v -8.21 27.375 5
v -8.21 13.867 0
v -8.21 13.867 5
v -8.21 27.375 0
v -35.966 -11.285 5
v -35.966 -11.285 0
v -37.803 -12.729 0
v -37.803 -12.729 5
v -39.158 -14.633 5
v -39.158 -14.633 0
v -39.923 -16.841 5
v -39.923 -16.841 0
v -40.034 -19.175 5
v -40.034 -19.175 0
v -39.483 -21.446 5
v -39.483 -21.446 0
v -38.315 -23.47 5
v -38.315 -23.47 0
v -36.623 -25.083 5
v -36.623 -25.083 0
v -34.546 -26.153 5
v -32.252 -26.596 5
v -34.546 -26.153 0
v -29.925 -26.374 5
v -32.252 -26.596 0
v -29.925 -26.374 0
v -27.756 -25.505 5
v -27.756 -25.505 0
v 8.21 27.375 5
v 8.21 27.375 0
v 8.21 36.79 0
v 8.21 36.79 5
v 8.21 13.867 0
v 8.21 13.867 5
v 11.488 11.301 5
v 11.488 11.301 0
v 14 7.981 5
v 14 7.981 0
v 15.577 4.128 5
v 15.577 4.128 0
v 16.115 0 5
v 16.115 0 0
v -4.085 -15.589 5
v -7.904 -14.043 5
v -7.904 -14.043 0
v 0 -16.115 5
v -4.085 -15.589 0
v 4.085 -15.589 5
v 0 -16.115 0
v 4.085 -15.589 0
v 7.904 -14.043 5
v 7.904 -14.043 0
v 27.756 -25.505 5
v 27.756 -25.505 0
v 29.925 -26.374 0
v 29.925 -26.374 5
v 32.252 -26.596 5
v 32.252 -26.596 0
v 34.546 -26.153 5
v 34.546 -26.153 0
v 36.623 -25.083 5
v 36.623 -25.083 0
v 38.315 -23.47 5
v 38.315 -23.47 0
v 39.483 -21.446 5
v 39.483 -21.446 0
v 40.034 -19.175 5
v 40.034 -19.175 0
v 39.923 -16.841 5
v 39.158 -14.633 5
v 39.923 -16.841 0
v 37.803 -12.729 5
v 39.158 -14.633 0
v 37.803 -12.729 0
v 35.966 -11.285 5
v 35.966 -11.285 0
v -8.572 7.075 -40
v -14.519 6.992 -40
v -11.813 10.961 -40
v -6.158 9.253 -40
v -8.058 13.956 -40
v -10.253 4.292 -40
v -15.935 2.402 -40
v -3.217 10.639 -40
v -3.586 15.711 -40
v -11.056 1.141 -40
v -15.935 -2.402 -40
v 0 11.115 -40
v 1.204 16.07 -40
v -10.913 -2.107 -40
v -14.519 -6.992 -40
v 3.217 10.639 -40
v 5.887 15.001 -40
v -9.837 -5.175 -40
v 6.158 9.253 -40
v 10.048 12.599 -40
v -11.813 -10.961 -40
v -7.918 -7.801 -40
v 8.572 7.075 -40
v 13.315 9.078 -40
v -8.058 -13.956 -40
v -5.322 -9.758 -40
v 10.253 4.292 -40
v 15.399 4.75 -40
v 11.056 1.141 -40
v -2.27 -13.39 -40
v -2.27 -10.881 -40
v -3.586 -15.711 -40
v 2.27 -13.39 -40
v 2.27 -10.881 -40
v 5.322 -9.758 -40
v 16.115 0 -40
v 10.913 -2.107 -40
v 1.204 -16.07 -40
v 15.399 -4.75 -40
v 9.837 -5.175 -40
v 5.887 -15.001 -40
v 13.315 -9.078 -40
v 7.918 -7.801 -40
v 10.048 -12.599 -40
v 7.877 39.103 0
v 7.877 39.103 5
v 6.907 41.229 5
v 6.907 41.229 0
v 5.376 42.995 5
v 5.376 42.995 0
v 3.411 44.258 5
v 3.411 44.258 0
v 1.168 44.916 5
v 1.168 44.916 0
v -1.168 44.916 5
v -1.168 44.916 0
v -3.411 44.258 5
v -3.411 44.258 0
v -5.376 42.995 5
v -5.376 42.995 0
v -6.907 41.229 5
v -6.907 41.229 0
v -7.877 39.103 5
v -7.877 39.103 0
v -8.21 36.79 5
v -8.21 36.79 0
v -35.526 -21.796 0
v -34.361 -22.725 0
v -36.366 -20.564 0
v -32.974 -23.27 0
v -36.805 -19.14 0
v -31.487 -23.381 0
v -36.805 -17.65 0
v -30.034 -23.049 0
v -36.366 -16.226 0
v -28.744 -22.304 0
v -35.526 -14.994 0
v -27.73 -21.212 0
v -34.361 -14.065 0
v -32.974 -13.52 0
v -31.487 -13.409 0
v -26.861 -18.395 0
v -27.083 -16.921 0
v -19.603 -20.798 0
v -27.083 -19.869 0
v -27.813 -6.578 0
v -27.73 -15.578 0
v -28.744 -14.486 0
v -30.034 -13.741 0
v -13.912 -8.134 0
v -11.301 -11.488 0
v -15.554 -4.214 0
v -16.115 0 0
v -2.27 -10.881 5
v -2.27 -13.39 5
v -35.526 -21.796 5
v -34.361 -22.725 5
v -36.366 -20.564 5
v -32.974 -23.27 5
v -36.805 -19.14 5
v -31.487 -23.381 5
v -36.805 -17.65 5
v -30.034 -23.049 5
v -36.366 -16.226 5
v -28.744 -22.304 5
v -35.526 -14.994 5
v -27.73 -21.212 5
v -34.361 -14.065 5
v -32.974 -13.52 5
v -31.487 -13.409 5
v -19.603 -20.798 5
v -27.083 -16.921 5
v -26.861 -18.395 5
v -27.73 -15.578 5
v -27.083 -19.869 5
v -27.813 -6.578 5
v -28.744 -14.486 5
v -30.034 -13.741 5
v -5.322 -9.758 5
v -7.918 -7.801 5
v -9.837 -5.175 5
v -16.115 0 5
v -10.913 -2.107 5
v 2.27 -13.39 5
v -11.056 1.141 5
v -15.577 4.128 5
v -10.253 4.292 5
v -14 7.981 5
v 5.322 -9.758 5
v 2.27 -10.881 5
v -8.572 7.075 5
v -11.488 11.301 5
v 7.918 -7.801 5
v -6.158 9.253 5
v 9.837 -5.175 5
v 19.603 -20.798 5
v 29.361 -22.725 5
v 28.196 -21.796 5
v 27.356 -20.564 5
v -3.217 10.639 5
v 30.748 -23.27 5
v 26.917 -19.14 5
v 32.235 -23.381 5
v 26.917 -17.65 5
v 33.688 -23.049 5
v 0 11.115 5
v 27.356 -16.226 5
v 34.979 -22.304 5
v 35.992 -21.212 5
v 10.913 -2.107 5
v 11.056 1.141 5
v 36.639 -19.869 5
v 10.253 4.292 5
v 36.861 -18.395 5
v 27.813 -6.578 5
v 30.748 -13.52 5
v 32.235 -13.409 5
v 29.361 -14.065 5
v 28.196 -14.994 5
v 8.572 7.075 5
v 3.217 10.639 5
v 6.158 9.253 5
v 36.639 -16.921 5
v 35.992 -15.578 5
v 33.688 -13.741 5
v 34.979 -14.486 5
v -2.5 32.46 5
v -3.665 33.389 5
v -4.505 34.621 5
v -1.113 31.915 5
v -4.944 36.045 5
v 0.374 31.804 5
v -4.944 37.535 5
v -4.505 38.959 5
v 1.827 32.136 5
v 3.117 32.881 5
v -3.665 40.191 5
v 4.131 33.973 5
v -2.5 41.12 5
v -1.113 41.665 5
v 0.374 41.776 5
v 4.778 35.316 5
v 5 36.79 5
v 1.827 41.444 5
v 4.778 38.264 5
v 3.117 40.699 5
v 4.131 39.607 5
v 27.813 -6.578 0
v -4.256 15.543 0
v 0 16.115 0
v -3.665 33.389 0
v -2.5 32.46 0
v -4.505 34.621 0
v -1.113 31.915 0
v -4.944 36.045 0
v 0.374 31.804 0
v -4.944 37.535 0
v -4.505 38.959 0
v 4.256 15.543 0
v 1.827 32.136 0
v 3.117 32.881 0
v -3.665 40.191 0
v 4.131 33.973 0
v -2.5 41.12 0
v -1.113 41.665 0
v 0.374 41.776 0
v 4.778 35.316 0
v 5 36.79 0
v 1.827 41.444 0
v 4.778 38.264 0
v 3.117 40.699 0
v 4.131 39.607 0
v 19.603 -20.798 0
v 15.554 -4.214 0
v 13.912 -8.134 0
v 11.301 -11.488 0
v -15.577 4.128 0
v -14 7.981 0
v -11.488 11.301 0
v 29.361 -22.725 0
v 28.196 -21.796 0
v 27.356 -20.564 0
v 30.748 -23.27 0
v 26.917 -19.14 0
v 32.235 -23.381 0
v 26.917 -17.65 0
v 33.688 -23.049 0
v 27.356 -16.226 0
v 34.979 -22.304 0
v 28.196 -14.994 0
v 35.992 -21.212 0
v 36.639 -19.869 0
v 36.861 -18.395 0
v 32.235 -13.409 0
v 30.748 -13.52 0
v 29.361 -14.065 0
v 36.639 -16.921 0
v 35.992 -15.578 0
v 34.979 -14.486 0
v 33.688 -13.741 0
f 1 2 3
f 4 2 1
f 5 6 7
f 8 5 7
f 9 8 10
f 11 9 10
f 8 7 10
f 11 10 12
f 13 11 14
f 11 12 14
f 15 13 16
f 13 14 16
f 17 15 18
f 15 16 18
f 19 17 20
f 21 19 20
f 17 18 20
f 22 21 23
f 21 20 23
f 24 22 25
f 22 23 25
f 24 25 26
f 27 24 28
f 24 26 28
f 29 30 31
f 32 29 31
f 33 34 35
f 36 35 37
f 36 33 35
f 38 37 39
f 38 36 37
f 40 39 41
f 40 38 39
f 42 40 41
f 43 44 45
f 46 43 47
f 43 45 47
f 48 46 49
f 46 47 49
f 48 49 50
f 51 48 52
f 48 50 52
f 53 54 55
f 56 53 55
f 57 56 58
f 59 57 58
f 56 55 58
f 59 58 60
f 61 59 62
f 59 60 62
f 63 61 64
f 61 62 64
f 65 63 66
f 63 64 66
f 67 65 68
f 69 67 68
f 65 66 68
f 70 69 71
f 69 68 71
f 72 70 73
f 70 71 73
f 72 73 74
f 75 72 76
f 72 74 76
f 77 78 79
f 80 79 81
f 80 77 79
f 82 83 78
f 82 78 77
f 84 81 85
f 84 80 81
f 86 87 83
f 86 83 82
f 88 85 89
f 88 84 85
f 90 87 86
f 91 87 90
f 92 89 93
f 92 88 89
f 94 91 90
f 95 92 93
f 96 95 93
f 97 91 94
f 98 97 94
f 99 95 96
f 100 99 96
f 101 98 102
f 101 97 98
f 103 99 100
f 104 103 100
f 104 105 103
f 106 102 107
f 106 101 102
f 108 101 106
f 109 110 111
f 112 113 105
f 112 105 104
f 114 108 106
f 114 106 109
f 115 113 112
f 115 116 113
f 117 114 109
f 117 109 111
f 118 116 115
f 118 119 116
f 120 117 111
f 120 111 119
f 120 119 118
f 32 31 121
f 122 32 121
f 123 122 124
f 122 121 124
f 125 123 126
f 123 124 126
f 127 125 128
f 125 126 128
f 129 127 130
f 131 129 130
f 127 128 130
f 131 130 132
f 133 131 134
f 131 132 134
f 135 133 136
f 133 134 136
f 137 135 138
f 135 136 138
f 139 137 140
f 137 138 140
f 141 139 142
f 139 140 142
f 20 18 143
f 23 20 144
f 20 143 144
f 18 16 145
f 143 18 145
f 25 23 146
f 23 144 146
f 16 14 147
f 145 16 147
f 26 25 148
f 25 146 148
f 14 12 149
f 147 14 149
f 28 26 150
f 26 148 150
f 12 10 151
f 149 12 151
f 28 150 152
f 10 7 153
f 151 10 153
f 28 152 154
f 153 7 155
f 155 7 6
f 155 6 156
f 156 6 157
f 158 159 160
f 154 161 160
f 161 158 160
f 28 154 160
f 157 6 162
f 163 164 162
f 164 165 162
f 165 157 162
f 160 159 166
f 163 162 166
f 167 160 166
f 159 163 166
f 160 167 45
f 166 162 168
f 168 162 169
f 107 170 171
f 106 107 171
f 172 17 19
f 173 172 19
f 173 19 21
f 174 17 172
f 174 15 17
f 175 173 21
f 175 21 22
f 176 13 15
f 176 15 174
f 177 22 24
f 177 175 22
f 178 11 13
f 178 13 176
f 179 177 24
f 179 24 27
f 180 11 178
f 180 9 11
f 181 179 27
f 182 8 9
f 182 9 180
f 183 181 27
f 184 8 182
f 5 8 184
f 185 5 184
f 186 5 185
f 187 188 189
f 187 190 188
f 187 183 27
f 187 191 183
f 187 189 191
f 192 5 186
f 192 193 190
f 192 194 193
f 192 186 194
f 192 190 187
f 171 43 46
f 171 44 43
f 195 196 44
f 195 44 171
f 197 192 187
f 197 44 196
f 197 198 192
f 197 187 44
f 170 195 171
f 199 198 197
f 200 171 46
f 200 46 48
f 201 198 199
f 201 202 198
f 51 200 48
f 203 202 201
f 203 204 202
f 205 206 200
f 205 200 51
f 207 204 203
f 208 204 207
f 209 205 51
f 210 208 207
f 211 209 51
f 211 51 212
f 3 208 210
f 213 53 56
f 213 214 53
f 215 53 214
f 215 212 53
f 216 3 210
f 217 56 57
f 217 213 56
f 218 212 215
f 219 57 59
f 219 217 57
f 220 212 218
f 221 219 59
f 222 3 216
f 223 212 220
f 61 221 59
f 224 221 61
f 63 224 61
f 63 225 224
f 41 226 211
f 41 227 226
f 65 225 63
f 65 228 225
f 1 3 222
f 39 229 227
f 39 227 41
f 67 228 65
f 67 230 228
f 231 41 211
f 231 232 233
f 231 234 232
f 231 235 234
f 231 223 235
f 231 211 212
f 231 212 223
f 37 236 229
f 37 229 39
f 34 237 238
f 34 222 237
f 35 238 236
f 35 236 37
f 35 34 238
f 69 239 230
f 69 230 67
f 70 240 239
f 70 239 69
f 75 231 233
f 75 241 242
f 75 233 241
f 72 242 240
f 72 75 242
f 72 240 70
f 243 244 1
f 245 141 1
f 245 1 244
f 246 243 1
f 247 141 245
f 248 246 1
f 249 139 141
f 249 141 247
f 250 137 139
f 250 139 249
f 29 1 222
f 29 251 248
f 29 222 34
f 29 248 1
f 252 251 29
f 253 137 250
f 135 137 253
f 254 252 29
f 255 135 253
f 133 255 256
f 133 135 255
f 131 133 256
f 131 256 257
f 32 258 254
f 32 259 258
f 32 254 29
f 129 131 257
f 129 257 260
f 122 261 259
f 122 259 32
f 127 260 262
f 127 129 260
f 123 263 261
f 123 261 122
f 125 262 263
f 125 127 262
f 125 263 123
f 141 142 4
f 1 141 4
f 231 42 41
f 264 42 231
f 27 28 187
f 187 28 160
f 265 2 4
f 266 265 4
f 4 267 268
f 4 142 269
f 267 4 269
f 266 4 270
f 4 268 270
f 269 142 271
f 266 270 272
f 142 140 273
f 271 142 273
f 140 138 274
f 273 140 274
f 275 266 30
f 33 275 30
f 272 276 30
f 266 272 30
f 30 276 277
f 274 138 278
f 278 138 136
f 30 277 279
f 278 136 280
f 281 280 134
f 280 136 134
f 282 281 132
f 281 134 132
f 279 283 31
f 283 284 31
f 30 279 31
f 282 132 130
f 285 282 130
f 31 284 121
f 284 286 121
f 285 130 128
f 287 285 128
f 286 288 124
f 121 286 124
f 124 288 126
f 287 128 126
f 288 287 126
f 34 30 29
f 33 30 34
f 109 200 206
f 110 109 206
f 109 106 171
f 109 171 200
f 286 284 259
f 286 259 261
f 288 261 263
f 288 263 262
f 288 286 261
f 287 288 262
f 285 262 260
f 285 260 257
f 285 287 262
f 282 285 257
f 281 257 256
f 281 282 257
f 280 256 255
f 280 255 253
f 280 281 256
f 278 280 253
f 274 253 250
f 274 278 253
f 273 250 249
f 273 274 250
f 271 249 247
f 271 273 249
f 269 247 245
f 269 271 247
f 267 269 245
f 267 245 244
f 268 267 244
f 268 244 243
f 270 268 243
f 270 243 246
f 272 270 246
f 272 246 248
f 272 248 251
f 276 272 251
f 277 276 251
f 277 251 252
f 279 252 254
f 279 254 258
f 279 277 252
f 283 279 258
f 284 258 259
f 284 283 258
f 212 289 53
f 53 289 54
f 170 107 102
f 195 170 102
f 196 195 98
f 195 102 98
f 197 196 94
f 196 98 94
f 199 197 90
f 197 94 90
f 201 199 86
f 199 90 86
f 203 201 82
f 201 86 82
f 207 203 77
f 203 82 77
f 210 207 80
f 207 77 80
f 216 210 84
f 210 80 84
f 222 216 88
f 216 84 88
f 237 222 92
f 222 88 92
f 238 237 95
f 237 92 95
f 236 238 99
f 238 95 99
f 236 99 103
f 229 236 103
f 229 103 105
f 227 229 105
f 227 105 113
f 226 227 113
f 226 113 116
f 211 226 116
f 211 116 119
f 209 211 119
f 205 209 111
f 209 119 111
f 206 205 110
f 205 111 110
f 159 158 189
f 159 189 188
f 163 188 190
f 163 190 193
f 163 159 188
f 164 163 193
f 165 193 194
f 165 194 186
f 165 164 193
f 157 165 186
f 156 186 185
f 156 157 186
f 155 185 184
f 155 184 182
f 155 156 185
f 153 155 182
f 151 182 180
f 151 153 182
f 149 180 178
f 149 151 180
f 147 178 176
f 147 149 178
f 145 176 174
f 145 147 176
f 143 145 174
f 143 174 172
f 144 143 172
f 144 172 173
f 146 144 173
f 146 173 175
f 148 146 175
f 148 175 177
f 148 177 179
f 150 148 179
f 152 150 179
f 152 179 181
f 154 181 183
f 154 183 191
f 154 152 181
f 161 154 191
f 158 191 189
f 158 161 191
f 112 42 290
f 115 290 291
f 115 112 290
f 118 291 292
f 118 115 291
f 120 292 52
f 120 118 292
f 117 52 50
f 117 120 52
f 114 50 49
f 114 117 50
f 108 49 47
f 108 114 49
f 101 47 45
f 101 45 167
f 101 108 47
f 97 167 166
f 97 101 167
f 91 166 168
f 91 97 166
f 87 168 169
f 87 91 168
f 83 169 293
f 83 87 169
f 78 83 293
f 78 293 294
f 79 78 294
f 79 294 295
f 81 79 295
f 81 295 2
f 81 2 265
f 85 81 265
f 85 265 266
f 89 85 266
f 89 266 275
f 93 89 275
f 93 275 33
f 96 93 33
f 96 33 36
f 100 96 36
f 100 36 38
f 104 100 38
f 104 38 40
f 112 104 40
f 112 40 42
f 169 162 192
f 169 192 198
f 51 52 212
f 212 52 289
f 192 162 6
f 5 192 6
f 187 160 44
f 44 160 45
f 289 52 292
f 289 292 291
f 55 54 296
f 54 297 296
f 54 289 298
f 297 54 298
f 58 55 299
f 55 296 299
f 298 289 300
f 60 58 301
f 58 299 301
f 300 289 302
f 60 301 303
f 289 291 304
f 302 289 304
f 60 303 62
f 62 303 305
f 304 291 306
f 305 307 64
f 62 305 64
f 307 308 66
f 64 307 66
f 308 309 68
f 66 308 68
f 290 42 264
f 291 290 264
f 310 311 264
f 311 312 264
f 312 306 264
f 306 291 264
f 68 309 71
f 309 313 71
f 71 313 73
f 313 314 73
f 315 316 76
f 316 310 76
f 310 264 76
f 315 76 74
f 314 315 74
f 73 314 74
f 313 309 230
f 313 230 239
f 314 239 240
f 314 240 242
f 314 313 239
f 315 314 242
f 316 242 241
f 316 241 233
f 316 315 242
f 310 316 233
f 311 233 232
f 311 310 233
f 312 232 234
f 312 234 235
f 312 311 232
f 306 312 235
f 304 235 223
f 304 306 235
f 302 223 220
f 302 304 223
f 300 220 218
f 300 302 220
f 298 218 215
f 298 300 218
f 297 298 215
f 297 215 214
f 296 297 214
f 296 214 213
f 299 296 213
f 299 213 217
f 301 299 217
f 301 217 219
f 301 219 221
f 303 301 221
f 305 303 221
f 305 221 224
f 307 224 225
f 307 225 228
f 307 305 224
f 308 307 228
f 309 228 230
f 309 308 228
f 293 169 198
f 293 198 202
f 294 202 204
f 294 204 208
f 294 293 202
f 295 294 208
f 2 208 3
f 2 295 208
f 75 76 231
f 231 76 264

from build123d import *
from build123d.topology import SkipClean

# Parameters (mm, degrees)
SZKIC1_R                    = 5
SZKIC1_R_2                  = 11.115
DODANIE_WYCI_GNI_CIE1_DEPTH = 5
DODANIE_WYCI_GNI_CIE2_START = 40
SZKIC2_R                    = 16.115
SZKIC2_R_2                  = 11.115
DODANIE_WYCI_GNI_CIE2_DEPTH = 40
WYTNIJ_WYCI_GNI_CIE1_DEPTH  = 76.204328466
WYTNIJ_WYCI_GNI_CIE2_DEPTH  = 73.323516369


with BuildPart() as part:
    # Szkic1 → Dodanie-wyciągnięcie1 (new body)
    with BuildSketch(Plane.XY):
        with BuildLine():
            Line((35.966074605, -11.284931435), (27.812788277, -6.577629379))
            ThreePointArc((27.812788277, -6.577629379), (24.75100604, 14.29), (8.21, 27.375395888))
            Line((8.21, 27.375395888), (8.21, 36.79))
            ThreePointArc((8.21, 36.79), (0, 45), (-8.21, 36.79))
            Line((-8.21, 36.79), (-8.21, 27.375395888))
            ThreePointArc((-8.21, 27.375395888), (-24.75100604, 14.29), (-27.812788277, -6.577629379))
            Line((-27.812788277, -6.577629379), (-35.966074605, -11.284931435))
            ThreePointArc((-35.966074605, -11.284931435), (-38.97114317, -22.5), (-27.756074605, -25.505068565))
            Line((-27.756074605, -25.505068565), (-19.602788277, -20.797766509))
            ThreePointArc((-19.602788277, -20.797766509), (0, -28.58), (19.602788277, -20.797766509))
            Line((19.602788277, -20.797766509), (27.756074605, -25.505068565))
            ThreePointArc((27.756074605, -25.505068565), (38.97114317, -22.5), (35.966074605, -11.284931435))
        make_face()
        with Locations((0, 36.79)):
            Circle(SZKIC1_R, mode=Mode.SUBTRACT)
        with Locations((31.861074605, -18.395)):
            Circle(SZKIC1_R, mode=Mode.SUBTRACT)
        with Locations((-31.861074605, -18.395)):
            Circle(SZKIC1_R, mode=Mode.SUBTRACT)
        Circle(SZKIC1_R_2, mode=Mode.SUBTRACT)
    extrude(amount=DODANIE_WYCI_GNI_CIE1_DEPTH)

    # Szkic2 → Dodanie-wyciągnięcie2 (add)
    with SkipClean():  # the faces are left unmerged after this step: merging them gives an invalid solid
        with BuildSketch(Plane(origin=(0, 0, 0), x_dir=(-1, 0, 0), z_dir=(0, 0, -1)).offset(DODANIE_WYCI_GNI_CIE2_START)):
            with Locations(Location((0, 0, 0), (0, 0, 180))):
                Circle(SZKIC2_R)
            Circle(SZKIC2_R_2, mode=Mode.SUBTRACT)
        extrude(amount=-DODANIE_WYCI_GNI_CIE2_DEPTH)

    # Szkic3 → Wytnij-wyciągnięcie1 (cut, through all)
    with BuildSketch(Plane.XY.offset(5)):
        Polygon((2.27, -10.880731823), (2.27, -7.598635721), (-2.27, -7.598635721), (-2.27, -10.880731823), (-2.27, -13.39), (2.27, -13.39), align=None)
    extrude(amount=-WYTNIJ_WYCI_GNI_CIE1_DEPTH, mode=Mode.SUBTRACT)

    # Szkic4 → Wytnij-wyciągnięcie2 (cut, through all)
    with SkipClean():  # the faces are left unmerged after this step: merging them gives an invalid solid
        with BuildSketch(Plane(origin=(0, 0, 0), x_dir=(-1, 0, 0), z_dir=(0, 0, -1))):
            with BuildLine():
                Line((19.602788277, -20.797766509), (7.904031757, -14.043486283))
                ThreePointArc((7.904031757, -14.043486283), (0, -16.115), (-7.904031757, -14.043486283))
                Line((-7.904031757, -14.043486283), (-19.602788277, -20.797766509))
                ThreePointArc((-19.602788277, -20.797766509), (0, -28.58), (19.602788277, -20.797766509))
            make_face()
            with BuildLine():
                Line((27.812788277, -6.577629379), (16.115, 0))
                ThreePointArc((16.115, 0), (13.999953125, 7.980885759), (8.21, 13.866835436))
                Line((8.21, 13.866835436), (8.21, 27.375395888))
                ThreePointArc((8.21, 27.375395888), (24.75100604, 14.29), (27.812788277, -6.577629379))
            make_face()
            with BuildLine():
                Line((-8.21, 27.375395888), (-8.21, 13.866835436))
                ThreePointArc((-8.21, 13.866835436), (-13.999953125, 7.980885759), (-16.115, 0))
                Line((-16.115, 0), (-27.812788277, -6.577629379))
                ThreePointArc((-27.812788277, -6.577629379), (-24.75100604, 14.29), (-8.21, 27.375395888))
            make_face()
        extrude(amount=-WYTNIJ_WYCI_GNI_CIE2_DEPTH, mode=Mode.SUBTRACT)


solid = part.part
